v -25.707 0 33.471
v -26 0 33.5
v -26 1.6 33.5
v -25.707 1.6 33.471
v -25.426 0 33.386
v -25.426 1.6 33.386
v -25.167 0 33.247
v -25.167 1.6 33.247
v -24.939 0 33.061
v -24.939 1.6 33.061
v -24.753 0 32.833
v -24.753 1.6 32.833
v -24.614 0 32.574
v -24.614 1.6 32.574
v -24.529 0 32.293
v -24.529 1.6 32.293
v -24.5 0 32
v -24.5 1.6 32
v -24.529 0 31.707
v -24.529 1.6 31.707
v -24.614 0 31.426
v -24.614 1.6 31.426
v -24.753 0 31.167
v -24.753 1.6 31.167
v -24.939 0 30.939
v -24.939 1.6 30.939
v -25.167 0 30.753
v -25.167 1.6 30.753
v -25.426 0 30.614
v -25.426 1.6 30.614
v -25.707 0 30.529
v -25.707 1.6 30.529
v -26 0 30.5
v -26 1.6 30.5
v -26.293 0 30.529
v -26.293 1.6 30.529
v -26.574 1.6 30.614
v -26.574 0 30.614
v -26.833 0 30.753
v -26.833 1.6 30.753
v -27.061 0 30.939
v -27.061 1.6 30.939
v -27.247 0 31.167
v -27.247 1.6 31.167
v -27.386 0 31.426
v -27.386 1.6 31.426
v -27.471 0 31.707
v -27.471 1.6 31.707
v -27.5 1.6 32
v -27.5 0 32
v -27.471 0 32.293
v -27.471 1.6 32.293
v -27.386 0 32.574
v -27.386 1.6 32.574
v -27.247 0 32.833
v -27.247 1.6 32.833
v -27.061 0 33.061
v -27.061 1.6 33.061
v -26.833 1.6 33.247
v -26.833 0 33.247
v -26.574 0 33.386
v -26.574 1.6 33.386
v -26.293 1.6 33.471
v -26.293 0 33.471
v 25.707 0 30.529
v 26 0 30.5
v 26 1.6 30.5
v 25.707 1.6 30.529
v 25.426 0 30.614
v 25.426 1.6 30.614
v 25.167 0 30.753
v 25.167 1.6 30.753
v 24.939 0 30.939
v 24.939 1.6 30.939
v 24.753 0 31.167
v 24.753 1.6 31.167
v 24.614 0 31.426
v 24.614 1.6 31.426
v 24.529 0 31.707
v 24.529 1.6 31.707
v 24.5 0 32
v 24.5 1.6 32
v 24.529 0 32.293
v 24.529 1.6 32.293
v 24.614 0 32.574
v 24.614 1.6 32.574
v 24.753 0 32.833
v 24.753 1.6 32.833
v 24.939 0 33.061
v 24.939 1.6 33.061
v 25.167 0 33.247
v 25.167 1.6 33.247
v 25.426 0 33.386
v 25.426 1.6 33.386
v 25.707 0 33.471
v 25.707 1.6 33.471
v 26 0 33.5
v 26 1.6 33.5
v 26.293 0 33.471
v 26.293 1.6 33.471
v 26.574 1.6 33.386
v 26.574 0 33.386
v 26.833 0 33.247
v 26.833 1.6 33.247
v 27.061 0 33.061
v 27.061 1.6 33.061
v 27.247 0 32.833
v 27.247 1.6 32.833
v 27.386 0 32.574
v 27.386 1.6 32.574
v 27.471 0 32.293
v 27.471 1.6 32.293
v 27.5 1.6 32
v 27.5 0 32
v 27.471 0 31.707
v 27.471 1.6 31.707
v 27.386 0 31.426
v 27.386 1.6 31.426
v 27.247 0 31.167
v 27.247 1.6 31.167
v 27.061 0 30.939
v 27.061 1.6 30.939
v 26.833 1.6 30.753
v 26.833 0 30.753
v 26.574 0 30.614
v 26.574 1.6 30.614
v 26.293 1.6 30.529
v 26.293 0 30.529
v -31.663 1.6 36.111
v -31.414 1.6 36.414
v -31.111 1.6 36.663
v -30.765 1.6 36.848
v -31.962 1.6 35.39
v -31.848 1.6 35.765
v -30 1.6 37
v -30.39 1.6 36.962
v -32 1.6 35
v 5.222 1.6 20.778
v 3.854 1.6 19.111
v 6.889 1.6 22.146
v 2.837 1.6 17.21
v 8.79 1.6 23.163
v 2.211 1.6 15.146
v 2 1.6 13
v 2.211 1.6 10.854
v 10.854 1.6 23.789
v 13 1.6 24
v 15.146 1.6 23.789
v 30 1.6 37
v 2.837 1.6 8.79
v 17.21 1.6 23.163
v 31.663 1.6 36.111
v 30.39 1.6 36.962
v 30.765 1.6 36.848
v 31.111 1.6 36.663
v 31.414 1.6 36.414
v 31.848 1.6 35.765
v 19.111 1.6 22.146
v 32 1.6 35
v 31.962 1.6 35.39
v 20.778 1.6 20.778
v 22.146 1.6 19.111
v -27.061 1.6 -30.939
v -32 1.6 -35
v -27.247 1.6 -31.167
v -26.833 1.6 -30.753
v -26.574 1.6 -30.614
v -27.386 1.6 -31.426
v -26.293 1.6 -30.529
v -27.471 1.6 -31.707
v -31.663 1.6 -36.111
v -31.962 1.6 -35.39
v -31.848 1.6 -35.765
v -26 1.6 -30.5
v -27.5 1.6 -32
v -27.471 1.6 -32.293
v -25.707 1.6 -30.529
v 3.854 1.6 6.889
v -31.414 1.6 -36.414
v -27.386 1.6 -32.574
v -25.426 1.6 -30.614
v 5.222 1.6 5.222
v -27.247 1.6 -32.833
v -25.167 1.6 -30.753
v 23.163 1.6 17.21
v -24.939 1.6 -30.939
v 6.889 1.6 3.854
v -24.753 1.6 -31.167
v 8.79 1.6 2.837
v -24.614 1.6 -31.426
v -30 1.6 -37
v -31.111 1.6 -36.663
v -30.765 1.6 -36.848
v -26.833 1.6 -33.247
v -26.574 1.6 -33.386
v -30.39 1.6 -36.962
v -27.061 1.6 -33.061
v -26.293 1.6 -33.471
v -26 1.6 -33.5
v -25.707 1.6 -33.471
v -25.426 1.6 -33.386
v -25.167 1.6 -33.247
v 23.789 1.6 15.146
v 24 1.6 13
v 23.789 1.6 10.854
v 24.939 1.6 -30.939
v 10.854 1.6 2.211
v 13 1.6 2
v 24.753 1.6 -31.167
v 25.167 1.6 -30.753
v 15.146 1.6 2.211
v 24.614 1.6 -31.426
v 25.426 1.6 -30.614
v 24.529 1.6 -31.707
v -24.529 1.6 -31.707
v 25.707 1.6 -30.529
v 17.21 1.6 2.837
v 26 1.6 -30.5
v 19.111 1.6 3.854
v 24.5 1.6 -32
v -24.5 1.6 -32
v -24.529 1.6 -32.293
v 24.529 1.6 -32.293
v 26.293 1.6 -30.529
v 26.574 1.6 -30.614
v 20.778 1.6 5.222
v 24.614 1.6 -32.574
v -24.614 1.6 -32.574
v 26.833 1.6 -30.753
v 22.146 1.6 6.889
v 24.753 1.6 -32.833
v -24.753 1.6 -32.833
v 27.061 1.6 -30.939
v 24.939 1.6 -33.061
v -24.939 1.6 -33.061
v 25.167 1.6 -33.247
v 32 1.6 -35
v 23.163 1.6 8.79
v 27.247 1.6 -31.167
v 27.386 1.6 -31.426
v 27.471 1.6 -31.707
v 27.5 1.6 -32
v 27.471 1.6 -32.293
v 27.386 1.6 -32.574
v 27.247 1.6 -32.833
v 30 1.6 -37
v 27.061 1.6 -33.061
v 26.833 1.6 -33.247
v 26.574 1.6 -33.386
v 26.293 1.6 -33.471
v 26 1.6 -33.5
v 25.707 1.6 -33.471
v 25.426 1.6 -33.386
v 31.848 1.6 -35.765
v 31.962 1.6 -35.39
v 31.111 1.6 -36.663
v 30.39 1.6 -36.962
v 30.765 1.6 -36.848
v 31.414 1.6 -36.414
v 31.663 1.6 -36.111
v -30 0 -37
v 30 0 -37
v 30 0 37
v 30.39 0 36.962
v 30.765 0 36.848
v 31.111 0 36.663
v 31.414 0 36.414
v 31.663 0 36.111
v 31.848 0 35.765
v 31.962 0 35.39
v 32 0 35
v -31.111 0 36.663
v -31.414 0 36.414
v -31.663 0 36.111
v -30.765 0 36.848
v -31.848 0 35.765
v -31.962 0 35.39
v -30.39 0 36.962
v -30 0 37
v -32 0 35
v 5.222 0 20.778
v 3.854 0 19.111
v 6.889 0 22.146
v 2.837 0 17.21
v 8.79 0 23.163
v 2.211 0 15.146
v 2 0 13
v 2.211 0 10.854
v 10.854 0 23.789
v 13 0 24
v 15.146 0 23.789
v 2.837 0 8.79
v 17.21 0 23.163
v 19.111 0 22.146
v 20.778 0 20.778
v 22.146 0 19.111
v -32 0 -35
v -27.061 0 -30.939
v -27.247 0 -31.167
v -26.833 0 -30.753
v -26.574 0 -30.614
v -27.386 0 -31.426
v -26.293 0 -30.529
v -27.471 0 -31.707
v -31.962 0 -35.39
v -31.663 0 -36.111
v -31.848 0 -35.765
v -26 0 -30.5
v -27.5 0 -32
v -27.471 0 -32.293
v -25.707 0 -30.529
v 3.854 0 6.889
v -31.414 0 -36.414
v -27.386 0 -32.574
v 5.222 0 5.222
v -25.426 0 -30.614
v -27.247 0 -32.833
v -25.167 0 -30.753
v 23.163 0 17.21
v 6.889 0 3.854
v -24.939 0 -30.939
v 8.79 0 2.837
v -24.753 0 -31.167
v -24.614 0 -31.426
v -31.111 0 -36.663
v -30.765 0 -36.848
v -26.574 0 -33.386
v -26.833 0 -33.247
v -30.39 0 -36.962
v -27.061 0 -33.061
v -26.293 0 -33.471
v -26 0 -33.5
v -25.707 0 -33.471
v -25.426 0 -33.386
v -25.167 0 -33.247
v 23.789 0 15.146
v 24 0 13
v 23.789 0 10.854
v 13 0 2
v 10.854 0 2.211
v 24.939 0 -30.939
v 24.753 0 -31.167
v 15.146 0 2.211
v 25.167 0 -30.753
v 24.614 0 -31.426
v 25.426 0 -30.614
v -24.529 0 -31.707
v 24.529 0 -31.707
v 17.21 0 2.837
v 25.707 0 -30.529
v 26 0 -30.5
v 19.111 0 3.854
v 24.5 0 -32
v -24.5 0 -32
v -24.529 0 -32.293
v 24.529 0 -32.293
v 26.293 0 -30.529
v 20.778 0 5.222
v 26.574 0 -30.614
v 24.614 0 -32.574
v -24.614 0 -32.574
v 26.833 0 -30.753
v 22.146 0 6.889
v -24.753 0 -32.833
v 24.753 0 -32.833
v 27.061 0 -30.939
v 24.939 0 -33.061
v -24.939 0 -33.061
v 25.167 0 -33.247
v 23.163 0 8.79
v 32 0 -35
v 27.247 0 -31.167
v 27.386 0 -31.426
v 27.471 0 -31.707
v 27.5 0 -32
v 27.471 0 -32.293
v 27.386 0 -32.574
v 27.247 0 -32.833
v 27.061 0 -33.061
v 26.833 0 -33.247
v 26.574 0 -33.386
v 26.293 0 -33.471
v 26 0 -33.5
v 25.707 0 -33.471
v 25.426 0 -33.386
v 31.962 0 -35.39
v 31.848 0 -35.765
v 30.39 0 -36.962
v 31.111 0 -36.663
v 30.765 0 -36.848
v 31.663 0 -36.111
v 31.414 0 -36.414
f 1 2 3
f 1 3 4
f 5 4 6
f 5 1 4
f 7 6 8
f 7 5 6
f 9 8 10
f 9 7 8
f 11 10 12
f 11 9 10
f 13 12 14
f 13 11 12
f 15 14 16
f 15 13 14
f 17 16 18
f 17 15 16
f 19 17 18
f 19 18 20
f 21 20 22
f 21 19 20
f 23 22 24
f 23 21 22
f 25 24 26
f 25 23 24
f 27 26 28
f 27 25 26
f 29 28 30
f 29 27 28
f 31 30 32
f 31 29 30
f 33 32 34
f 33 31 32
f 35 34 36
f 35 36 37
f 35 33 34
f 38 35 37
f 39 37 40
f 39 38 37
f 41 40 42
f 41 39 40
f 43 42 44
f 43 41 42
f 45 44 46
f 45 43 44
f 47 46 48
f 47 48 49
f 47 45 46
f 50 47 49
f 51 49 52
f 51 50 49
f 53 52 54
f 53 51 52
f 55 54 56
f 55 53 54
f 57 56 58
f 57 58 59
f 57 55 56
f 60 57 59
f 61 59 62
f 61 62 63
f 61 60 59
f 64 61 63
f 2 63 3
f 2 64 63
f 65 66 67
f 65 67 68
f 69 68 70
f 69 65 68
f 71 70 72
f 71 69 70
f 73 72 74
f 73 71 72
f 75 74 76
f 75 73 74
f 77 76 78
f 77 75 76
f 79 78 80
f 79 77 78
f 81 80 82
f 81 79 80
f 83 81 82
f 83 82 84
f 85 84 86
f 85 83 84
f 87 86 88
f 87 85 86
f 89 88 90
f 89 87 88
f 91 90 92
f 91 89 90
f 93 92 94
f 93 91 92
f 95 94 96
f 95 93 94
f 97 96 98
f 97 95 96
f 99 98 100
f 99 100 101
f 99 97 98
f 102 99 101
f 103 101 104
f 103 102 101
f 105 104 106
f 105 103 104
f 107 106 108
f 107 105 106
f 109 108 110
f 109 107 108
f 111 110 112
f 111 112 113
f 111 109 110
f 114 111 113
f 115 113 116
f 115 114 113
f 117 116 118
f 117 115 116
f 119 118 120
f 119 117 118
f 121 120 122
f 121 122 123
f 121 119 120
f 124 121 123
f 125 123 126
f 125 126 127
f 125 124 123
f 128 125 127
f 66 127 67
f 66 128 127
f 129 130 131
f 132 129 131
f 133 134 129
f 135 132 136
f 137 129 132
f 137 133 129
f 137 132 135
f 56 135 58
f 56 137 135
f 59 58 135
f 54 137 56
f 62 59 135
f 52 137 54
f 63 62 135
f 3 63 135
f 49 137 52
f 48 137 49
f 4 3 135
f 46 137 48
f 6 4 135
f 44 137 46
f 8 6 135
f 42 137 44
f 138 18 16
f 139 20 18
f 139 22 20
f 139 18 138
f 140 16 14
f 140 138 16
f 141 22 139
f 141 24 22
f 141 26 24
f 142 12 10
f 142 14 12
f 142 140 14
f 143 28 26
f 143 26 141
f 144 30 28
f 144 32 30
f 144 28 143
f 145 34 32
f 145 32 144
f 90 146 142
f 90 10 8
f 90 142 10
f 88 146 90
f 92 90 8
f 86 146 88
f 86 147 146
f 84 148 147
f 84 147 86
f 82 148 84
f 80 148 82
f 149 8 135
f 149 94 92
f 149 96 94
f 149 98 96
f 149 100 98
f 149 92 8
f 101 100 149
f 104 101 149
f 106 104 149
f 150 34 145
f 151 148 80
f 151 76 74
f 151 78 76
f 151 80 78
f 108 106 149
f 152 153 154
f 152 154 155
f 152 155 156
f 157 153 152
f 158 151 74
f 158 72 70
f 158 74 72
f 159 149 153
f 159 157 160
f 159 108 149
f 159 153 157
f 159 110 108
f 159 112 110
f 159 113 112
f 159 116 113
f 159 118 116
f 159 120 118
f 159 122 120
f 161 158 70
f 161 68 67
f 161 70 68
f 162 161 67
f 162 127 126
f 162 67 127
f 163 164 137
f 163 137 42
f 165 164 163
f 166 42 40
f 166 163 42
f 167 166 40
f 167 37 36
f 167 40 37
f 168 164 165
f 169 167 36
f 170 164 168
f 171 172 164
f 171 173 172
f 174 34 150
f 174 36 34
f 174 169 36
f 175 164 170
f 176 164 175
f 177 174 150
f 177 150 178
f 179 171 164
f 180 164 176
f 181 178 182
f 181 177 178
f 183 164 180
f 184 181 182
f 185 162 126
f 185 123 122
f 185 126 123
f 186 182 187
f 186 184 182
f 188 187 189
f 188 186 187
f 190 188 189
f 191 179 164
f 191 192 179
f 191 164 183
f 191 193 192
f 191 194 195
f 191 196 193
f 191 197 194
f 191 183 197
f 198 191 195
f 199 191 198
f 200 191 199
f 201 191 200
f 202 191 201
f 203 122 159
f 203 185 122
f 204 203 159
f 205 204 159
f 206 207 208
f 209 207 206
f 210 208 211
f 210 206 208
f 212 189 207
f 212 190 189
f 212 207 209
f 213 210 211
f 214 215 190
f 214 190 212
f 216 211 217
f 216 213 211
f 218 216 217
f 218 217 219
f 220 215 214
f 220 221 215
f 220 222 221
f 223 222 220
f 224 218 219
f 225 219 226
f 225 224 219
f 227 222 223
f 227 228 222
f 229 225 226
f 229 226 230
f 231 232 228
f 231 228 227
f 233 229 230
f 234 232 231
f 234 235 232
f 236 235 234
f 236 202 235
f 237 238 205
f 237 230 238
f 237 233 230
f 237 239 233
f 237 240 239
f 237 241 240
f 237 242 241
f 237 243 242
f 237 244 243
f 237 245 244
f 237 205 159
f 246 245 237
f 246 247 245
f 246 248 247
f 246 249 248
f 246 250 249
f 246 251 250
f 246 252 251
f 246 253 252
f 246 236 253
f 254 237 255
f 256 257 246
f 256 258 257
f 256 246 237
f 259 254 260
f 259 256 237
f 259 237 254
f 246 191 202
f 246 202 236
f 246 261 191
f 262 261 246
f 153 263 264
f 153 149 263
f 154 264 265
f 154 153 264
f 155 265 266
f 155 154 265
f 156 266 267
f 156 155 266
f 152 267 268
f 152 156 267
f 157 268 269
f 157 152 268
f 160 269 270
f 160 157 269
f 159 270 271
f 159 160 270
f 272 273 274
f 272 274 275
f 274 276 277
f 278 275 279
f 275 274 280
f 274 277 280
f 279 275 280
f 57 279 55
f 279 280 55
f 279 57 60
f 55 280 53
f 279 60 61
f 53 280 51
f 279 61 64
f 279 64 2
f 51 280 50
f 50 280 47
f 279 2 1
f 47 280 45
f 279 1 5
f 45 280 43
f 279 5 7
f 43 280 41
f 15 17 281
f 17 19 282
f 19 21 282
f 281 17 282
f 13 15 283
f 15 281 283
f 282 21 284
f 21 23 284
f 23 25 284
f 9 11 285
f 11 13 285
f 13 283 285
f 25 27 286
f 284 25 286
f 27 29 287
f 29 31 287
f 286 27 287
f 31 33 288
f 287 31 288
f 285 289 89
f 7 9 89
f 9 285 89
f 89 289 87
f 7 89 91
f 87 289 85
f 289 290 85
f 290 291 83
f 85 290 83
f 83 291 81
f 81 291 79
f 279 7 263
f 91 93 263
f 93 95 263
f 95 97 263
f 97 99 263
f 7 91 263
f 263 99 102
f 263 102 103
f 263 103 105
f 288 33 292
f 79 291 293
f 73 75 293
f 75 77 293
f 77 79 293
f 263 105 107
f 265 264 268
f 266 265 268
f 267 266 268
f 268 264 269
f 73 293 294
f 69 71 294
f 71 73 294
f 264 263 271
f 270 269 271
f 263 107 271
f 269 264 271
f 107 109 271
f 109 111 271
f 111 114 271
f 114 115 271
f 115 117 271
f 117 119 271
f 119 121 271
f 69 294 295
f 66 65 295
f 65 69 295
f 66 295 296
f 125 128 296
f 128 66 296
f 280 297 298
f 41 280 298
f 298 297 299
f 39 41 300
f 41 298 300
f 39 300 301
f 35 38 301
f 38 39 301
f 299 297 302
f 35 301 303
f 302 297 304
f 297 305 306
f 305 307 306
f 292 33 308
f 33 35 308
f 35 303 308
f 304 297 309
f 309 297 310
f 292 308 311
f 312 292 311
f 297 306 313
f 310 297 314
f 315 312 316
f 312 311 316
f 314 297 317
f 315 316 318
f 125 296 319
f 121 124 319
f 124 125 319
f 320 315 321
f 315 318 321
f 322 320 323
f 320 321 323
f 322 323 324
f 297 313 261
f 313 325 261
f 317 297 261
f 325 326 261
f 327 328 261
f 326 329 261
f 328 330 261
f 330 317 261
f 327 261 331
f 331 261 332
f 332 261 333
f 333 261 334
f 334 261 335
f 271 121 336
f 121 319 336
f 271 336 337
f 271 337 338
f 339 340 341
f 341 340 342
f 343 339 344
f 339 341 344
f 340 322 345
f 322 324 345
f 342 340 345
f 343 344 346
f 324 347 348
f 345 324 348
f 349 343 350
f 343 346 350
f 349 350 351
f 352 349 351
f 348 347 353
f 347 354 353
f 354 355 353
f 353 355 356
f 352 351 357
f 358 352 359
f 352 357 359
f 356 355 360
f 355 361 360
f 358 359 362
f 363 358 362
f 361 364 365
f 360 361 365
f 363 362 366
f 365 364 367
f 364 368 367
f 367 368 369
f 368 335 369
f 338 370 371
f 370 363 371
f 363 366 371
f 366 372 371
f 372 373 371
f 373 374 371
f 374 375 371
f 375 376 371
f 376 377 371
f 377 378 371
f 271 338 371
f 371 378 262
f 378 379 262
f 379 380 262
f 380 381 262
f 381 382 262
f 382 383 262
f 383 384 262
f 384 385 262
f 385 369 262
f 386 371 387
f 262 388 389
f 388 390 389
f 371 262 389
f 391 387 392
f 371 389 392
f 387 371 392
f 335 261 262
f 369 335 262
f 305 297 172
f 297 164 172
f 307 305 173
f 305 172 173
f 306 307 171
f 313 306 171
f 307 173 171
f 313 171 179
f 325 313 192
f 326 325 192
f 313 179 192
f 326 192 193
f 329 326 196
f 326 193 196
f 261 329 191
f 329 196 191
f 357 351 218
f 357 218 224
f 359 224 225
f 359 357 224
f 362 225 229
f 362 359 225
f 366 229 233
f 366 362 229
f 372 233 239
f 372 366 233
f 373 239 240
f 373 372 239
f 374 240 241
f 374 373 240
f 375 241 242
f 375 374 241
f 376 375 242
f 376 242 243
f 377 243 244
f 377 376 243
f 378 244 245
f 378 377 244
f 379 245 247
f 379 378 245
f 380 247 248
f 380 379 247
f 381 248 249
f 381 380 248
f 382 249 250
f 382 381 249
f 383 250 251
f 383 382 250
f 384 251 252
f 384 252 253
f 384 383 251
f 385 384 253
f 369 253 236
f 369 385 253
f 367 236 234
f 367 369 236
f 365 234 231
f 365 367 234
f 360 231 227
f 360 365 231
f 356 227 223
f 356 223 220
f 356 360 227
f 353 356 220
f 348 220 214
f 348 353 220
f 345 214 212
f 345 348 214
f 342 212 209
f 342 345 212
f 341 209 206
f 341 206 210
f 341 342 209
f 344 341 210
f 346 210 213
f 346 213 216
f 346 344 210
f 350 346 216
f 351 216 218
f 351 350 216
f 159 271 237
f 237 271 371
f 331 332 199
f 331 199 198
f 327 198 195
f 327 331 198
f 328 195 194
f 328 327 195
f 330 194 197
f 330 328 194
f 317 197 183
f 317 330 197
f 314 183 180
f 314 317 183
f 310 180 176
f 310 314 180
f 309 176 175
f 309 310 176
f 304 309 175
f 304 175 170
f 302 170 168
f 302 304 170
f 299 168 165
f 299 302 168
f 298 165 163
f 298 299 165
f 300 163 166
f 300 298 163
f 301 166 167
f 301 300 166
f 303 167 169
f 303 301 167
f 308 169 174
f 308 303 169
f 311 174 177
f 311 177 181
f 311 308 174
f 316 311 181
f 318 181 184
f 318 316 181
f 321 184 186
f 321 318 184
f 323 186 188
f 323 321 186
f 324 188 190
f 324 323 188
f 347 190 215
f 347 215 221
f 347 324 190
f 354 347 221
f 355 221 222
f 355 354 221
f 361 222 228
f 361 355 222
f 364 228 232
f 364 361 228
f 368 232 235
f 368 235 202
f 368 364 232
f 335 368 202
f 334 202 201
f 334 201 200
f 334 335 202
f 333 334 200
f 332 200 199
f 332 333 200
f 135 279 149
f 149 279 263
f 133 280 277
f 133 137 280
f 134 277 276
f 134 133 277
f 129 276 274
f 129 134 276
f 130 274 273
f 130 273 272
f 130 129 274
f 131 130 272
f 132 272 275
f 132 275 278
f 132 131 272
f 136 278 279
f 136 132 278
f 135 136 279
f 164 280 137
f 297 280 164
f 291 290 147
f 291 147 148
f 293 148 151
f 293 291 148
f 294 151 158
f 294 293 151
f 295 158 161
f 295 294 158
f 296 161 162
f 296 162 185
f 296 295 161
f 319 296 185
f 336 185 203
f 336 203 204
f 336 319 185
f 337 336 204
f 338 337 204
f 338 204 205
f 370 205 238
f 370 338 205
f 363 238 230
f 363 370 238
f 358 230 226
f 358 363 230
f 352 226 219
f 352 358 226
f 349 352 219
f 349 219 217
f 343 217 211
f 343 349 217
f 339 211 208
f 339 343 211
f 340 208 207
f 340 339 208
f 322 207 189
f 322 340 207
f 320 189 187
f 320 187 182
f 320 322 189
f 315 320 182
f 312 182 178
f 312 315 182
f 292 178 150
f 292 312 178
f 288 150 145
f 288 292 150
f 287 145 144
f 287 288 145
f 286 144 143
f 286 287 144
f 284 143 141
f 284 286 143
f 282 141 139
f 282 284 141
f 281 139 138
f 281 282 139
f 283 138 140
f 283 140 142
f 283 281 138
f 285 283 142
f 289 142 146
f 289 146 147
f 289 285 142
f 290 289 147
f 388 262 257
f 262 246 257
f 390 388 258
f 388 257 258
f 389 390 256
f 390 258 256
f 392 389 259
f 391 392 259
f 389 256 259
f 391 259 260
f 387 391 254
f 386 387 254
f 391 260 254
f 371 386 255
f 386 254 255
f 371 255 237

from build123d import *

# Parameters (mm, degrees)
SKETCH_1_W      = 64
SKETCH_1_H      = 74
SKETCH_1_R      = 1.5
SKETCH_1_R_2    = 11
EXTRUDE_1_DEPTH = 1.6
FILLET_1_R      = 2


with BuildPart() as part:
    # 草图1 → 凸台-拉伸1 (new body)
    with BuildSketch(Plane(origin=(0, 0, 0), x_dir=(1, 0, 0), z_dir=(0, 1, 0))):
        Rectangle(SKETCH_1_W, SKETCH_1_H)
        with Locations(Location((26, 32, 0), (0, 0, 270))):
            Circle(SKETCH_1_R, mode=Mode.SUBTRACT)
        with Locations(Location((-26, 32, 0), (0, 0, 90))):
            Circle(SKETCH_1_R, mode=Mode.SUBTRACT)
        with Locations(Location((13, -13, 0), (0, 0, 270))):
            Circle(SKETCH_1_R_2, mode=Mode.SUBTRACT)
        with Locations(Location((26, -32, 0), (0, 0, 90))):
            Circle(SKETCH_1_R, mode=Mode.SUBTRACT)
        with Locations(Location((-26, -32, 0), (0, 0, 270))):
            Circle(SKETCH_1_R, mode=Mode.SUBTRACT)
    extrude(amount=EXTRUDE_1_DEPTH)

    # 圆角1
    fillet_1_edges = [part.edges().sort_by_distance(p)[0] for p in [
        (32, 0.8, 37),
        (-32, 0.8, 37),
        (-32, 0.8, -37),
        (32, 0.8, -37),
    ]]
    fillet(fillet_1_edges, radius=FILLET_1_R)


solid = part.part
